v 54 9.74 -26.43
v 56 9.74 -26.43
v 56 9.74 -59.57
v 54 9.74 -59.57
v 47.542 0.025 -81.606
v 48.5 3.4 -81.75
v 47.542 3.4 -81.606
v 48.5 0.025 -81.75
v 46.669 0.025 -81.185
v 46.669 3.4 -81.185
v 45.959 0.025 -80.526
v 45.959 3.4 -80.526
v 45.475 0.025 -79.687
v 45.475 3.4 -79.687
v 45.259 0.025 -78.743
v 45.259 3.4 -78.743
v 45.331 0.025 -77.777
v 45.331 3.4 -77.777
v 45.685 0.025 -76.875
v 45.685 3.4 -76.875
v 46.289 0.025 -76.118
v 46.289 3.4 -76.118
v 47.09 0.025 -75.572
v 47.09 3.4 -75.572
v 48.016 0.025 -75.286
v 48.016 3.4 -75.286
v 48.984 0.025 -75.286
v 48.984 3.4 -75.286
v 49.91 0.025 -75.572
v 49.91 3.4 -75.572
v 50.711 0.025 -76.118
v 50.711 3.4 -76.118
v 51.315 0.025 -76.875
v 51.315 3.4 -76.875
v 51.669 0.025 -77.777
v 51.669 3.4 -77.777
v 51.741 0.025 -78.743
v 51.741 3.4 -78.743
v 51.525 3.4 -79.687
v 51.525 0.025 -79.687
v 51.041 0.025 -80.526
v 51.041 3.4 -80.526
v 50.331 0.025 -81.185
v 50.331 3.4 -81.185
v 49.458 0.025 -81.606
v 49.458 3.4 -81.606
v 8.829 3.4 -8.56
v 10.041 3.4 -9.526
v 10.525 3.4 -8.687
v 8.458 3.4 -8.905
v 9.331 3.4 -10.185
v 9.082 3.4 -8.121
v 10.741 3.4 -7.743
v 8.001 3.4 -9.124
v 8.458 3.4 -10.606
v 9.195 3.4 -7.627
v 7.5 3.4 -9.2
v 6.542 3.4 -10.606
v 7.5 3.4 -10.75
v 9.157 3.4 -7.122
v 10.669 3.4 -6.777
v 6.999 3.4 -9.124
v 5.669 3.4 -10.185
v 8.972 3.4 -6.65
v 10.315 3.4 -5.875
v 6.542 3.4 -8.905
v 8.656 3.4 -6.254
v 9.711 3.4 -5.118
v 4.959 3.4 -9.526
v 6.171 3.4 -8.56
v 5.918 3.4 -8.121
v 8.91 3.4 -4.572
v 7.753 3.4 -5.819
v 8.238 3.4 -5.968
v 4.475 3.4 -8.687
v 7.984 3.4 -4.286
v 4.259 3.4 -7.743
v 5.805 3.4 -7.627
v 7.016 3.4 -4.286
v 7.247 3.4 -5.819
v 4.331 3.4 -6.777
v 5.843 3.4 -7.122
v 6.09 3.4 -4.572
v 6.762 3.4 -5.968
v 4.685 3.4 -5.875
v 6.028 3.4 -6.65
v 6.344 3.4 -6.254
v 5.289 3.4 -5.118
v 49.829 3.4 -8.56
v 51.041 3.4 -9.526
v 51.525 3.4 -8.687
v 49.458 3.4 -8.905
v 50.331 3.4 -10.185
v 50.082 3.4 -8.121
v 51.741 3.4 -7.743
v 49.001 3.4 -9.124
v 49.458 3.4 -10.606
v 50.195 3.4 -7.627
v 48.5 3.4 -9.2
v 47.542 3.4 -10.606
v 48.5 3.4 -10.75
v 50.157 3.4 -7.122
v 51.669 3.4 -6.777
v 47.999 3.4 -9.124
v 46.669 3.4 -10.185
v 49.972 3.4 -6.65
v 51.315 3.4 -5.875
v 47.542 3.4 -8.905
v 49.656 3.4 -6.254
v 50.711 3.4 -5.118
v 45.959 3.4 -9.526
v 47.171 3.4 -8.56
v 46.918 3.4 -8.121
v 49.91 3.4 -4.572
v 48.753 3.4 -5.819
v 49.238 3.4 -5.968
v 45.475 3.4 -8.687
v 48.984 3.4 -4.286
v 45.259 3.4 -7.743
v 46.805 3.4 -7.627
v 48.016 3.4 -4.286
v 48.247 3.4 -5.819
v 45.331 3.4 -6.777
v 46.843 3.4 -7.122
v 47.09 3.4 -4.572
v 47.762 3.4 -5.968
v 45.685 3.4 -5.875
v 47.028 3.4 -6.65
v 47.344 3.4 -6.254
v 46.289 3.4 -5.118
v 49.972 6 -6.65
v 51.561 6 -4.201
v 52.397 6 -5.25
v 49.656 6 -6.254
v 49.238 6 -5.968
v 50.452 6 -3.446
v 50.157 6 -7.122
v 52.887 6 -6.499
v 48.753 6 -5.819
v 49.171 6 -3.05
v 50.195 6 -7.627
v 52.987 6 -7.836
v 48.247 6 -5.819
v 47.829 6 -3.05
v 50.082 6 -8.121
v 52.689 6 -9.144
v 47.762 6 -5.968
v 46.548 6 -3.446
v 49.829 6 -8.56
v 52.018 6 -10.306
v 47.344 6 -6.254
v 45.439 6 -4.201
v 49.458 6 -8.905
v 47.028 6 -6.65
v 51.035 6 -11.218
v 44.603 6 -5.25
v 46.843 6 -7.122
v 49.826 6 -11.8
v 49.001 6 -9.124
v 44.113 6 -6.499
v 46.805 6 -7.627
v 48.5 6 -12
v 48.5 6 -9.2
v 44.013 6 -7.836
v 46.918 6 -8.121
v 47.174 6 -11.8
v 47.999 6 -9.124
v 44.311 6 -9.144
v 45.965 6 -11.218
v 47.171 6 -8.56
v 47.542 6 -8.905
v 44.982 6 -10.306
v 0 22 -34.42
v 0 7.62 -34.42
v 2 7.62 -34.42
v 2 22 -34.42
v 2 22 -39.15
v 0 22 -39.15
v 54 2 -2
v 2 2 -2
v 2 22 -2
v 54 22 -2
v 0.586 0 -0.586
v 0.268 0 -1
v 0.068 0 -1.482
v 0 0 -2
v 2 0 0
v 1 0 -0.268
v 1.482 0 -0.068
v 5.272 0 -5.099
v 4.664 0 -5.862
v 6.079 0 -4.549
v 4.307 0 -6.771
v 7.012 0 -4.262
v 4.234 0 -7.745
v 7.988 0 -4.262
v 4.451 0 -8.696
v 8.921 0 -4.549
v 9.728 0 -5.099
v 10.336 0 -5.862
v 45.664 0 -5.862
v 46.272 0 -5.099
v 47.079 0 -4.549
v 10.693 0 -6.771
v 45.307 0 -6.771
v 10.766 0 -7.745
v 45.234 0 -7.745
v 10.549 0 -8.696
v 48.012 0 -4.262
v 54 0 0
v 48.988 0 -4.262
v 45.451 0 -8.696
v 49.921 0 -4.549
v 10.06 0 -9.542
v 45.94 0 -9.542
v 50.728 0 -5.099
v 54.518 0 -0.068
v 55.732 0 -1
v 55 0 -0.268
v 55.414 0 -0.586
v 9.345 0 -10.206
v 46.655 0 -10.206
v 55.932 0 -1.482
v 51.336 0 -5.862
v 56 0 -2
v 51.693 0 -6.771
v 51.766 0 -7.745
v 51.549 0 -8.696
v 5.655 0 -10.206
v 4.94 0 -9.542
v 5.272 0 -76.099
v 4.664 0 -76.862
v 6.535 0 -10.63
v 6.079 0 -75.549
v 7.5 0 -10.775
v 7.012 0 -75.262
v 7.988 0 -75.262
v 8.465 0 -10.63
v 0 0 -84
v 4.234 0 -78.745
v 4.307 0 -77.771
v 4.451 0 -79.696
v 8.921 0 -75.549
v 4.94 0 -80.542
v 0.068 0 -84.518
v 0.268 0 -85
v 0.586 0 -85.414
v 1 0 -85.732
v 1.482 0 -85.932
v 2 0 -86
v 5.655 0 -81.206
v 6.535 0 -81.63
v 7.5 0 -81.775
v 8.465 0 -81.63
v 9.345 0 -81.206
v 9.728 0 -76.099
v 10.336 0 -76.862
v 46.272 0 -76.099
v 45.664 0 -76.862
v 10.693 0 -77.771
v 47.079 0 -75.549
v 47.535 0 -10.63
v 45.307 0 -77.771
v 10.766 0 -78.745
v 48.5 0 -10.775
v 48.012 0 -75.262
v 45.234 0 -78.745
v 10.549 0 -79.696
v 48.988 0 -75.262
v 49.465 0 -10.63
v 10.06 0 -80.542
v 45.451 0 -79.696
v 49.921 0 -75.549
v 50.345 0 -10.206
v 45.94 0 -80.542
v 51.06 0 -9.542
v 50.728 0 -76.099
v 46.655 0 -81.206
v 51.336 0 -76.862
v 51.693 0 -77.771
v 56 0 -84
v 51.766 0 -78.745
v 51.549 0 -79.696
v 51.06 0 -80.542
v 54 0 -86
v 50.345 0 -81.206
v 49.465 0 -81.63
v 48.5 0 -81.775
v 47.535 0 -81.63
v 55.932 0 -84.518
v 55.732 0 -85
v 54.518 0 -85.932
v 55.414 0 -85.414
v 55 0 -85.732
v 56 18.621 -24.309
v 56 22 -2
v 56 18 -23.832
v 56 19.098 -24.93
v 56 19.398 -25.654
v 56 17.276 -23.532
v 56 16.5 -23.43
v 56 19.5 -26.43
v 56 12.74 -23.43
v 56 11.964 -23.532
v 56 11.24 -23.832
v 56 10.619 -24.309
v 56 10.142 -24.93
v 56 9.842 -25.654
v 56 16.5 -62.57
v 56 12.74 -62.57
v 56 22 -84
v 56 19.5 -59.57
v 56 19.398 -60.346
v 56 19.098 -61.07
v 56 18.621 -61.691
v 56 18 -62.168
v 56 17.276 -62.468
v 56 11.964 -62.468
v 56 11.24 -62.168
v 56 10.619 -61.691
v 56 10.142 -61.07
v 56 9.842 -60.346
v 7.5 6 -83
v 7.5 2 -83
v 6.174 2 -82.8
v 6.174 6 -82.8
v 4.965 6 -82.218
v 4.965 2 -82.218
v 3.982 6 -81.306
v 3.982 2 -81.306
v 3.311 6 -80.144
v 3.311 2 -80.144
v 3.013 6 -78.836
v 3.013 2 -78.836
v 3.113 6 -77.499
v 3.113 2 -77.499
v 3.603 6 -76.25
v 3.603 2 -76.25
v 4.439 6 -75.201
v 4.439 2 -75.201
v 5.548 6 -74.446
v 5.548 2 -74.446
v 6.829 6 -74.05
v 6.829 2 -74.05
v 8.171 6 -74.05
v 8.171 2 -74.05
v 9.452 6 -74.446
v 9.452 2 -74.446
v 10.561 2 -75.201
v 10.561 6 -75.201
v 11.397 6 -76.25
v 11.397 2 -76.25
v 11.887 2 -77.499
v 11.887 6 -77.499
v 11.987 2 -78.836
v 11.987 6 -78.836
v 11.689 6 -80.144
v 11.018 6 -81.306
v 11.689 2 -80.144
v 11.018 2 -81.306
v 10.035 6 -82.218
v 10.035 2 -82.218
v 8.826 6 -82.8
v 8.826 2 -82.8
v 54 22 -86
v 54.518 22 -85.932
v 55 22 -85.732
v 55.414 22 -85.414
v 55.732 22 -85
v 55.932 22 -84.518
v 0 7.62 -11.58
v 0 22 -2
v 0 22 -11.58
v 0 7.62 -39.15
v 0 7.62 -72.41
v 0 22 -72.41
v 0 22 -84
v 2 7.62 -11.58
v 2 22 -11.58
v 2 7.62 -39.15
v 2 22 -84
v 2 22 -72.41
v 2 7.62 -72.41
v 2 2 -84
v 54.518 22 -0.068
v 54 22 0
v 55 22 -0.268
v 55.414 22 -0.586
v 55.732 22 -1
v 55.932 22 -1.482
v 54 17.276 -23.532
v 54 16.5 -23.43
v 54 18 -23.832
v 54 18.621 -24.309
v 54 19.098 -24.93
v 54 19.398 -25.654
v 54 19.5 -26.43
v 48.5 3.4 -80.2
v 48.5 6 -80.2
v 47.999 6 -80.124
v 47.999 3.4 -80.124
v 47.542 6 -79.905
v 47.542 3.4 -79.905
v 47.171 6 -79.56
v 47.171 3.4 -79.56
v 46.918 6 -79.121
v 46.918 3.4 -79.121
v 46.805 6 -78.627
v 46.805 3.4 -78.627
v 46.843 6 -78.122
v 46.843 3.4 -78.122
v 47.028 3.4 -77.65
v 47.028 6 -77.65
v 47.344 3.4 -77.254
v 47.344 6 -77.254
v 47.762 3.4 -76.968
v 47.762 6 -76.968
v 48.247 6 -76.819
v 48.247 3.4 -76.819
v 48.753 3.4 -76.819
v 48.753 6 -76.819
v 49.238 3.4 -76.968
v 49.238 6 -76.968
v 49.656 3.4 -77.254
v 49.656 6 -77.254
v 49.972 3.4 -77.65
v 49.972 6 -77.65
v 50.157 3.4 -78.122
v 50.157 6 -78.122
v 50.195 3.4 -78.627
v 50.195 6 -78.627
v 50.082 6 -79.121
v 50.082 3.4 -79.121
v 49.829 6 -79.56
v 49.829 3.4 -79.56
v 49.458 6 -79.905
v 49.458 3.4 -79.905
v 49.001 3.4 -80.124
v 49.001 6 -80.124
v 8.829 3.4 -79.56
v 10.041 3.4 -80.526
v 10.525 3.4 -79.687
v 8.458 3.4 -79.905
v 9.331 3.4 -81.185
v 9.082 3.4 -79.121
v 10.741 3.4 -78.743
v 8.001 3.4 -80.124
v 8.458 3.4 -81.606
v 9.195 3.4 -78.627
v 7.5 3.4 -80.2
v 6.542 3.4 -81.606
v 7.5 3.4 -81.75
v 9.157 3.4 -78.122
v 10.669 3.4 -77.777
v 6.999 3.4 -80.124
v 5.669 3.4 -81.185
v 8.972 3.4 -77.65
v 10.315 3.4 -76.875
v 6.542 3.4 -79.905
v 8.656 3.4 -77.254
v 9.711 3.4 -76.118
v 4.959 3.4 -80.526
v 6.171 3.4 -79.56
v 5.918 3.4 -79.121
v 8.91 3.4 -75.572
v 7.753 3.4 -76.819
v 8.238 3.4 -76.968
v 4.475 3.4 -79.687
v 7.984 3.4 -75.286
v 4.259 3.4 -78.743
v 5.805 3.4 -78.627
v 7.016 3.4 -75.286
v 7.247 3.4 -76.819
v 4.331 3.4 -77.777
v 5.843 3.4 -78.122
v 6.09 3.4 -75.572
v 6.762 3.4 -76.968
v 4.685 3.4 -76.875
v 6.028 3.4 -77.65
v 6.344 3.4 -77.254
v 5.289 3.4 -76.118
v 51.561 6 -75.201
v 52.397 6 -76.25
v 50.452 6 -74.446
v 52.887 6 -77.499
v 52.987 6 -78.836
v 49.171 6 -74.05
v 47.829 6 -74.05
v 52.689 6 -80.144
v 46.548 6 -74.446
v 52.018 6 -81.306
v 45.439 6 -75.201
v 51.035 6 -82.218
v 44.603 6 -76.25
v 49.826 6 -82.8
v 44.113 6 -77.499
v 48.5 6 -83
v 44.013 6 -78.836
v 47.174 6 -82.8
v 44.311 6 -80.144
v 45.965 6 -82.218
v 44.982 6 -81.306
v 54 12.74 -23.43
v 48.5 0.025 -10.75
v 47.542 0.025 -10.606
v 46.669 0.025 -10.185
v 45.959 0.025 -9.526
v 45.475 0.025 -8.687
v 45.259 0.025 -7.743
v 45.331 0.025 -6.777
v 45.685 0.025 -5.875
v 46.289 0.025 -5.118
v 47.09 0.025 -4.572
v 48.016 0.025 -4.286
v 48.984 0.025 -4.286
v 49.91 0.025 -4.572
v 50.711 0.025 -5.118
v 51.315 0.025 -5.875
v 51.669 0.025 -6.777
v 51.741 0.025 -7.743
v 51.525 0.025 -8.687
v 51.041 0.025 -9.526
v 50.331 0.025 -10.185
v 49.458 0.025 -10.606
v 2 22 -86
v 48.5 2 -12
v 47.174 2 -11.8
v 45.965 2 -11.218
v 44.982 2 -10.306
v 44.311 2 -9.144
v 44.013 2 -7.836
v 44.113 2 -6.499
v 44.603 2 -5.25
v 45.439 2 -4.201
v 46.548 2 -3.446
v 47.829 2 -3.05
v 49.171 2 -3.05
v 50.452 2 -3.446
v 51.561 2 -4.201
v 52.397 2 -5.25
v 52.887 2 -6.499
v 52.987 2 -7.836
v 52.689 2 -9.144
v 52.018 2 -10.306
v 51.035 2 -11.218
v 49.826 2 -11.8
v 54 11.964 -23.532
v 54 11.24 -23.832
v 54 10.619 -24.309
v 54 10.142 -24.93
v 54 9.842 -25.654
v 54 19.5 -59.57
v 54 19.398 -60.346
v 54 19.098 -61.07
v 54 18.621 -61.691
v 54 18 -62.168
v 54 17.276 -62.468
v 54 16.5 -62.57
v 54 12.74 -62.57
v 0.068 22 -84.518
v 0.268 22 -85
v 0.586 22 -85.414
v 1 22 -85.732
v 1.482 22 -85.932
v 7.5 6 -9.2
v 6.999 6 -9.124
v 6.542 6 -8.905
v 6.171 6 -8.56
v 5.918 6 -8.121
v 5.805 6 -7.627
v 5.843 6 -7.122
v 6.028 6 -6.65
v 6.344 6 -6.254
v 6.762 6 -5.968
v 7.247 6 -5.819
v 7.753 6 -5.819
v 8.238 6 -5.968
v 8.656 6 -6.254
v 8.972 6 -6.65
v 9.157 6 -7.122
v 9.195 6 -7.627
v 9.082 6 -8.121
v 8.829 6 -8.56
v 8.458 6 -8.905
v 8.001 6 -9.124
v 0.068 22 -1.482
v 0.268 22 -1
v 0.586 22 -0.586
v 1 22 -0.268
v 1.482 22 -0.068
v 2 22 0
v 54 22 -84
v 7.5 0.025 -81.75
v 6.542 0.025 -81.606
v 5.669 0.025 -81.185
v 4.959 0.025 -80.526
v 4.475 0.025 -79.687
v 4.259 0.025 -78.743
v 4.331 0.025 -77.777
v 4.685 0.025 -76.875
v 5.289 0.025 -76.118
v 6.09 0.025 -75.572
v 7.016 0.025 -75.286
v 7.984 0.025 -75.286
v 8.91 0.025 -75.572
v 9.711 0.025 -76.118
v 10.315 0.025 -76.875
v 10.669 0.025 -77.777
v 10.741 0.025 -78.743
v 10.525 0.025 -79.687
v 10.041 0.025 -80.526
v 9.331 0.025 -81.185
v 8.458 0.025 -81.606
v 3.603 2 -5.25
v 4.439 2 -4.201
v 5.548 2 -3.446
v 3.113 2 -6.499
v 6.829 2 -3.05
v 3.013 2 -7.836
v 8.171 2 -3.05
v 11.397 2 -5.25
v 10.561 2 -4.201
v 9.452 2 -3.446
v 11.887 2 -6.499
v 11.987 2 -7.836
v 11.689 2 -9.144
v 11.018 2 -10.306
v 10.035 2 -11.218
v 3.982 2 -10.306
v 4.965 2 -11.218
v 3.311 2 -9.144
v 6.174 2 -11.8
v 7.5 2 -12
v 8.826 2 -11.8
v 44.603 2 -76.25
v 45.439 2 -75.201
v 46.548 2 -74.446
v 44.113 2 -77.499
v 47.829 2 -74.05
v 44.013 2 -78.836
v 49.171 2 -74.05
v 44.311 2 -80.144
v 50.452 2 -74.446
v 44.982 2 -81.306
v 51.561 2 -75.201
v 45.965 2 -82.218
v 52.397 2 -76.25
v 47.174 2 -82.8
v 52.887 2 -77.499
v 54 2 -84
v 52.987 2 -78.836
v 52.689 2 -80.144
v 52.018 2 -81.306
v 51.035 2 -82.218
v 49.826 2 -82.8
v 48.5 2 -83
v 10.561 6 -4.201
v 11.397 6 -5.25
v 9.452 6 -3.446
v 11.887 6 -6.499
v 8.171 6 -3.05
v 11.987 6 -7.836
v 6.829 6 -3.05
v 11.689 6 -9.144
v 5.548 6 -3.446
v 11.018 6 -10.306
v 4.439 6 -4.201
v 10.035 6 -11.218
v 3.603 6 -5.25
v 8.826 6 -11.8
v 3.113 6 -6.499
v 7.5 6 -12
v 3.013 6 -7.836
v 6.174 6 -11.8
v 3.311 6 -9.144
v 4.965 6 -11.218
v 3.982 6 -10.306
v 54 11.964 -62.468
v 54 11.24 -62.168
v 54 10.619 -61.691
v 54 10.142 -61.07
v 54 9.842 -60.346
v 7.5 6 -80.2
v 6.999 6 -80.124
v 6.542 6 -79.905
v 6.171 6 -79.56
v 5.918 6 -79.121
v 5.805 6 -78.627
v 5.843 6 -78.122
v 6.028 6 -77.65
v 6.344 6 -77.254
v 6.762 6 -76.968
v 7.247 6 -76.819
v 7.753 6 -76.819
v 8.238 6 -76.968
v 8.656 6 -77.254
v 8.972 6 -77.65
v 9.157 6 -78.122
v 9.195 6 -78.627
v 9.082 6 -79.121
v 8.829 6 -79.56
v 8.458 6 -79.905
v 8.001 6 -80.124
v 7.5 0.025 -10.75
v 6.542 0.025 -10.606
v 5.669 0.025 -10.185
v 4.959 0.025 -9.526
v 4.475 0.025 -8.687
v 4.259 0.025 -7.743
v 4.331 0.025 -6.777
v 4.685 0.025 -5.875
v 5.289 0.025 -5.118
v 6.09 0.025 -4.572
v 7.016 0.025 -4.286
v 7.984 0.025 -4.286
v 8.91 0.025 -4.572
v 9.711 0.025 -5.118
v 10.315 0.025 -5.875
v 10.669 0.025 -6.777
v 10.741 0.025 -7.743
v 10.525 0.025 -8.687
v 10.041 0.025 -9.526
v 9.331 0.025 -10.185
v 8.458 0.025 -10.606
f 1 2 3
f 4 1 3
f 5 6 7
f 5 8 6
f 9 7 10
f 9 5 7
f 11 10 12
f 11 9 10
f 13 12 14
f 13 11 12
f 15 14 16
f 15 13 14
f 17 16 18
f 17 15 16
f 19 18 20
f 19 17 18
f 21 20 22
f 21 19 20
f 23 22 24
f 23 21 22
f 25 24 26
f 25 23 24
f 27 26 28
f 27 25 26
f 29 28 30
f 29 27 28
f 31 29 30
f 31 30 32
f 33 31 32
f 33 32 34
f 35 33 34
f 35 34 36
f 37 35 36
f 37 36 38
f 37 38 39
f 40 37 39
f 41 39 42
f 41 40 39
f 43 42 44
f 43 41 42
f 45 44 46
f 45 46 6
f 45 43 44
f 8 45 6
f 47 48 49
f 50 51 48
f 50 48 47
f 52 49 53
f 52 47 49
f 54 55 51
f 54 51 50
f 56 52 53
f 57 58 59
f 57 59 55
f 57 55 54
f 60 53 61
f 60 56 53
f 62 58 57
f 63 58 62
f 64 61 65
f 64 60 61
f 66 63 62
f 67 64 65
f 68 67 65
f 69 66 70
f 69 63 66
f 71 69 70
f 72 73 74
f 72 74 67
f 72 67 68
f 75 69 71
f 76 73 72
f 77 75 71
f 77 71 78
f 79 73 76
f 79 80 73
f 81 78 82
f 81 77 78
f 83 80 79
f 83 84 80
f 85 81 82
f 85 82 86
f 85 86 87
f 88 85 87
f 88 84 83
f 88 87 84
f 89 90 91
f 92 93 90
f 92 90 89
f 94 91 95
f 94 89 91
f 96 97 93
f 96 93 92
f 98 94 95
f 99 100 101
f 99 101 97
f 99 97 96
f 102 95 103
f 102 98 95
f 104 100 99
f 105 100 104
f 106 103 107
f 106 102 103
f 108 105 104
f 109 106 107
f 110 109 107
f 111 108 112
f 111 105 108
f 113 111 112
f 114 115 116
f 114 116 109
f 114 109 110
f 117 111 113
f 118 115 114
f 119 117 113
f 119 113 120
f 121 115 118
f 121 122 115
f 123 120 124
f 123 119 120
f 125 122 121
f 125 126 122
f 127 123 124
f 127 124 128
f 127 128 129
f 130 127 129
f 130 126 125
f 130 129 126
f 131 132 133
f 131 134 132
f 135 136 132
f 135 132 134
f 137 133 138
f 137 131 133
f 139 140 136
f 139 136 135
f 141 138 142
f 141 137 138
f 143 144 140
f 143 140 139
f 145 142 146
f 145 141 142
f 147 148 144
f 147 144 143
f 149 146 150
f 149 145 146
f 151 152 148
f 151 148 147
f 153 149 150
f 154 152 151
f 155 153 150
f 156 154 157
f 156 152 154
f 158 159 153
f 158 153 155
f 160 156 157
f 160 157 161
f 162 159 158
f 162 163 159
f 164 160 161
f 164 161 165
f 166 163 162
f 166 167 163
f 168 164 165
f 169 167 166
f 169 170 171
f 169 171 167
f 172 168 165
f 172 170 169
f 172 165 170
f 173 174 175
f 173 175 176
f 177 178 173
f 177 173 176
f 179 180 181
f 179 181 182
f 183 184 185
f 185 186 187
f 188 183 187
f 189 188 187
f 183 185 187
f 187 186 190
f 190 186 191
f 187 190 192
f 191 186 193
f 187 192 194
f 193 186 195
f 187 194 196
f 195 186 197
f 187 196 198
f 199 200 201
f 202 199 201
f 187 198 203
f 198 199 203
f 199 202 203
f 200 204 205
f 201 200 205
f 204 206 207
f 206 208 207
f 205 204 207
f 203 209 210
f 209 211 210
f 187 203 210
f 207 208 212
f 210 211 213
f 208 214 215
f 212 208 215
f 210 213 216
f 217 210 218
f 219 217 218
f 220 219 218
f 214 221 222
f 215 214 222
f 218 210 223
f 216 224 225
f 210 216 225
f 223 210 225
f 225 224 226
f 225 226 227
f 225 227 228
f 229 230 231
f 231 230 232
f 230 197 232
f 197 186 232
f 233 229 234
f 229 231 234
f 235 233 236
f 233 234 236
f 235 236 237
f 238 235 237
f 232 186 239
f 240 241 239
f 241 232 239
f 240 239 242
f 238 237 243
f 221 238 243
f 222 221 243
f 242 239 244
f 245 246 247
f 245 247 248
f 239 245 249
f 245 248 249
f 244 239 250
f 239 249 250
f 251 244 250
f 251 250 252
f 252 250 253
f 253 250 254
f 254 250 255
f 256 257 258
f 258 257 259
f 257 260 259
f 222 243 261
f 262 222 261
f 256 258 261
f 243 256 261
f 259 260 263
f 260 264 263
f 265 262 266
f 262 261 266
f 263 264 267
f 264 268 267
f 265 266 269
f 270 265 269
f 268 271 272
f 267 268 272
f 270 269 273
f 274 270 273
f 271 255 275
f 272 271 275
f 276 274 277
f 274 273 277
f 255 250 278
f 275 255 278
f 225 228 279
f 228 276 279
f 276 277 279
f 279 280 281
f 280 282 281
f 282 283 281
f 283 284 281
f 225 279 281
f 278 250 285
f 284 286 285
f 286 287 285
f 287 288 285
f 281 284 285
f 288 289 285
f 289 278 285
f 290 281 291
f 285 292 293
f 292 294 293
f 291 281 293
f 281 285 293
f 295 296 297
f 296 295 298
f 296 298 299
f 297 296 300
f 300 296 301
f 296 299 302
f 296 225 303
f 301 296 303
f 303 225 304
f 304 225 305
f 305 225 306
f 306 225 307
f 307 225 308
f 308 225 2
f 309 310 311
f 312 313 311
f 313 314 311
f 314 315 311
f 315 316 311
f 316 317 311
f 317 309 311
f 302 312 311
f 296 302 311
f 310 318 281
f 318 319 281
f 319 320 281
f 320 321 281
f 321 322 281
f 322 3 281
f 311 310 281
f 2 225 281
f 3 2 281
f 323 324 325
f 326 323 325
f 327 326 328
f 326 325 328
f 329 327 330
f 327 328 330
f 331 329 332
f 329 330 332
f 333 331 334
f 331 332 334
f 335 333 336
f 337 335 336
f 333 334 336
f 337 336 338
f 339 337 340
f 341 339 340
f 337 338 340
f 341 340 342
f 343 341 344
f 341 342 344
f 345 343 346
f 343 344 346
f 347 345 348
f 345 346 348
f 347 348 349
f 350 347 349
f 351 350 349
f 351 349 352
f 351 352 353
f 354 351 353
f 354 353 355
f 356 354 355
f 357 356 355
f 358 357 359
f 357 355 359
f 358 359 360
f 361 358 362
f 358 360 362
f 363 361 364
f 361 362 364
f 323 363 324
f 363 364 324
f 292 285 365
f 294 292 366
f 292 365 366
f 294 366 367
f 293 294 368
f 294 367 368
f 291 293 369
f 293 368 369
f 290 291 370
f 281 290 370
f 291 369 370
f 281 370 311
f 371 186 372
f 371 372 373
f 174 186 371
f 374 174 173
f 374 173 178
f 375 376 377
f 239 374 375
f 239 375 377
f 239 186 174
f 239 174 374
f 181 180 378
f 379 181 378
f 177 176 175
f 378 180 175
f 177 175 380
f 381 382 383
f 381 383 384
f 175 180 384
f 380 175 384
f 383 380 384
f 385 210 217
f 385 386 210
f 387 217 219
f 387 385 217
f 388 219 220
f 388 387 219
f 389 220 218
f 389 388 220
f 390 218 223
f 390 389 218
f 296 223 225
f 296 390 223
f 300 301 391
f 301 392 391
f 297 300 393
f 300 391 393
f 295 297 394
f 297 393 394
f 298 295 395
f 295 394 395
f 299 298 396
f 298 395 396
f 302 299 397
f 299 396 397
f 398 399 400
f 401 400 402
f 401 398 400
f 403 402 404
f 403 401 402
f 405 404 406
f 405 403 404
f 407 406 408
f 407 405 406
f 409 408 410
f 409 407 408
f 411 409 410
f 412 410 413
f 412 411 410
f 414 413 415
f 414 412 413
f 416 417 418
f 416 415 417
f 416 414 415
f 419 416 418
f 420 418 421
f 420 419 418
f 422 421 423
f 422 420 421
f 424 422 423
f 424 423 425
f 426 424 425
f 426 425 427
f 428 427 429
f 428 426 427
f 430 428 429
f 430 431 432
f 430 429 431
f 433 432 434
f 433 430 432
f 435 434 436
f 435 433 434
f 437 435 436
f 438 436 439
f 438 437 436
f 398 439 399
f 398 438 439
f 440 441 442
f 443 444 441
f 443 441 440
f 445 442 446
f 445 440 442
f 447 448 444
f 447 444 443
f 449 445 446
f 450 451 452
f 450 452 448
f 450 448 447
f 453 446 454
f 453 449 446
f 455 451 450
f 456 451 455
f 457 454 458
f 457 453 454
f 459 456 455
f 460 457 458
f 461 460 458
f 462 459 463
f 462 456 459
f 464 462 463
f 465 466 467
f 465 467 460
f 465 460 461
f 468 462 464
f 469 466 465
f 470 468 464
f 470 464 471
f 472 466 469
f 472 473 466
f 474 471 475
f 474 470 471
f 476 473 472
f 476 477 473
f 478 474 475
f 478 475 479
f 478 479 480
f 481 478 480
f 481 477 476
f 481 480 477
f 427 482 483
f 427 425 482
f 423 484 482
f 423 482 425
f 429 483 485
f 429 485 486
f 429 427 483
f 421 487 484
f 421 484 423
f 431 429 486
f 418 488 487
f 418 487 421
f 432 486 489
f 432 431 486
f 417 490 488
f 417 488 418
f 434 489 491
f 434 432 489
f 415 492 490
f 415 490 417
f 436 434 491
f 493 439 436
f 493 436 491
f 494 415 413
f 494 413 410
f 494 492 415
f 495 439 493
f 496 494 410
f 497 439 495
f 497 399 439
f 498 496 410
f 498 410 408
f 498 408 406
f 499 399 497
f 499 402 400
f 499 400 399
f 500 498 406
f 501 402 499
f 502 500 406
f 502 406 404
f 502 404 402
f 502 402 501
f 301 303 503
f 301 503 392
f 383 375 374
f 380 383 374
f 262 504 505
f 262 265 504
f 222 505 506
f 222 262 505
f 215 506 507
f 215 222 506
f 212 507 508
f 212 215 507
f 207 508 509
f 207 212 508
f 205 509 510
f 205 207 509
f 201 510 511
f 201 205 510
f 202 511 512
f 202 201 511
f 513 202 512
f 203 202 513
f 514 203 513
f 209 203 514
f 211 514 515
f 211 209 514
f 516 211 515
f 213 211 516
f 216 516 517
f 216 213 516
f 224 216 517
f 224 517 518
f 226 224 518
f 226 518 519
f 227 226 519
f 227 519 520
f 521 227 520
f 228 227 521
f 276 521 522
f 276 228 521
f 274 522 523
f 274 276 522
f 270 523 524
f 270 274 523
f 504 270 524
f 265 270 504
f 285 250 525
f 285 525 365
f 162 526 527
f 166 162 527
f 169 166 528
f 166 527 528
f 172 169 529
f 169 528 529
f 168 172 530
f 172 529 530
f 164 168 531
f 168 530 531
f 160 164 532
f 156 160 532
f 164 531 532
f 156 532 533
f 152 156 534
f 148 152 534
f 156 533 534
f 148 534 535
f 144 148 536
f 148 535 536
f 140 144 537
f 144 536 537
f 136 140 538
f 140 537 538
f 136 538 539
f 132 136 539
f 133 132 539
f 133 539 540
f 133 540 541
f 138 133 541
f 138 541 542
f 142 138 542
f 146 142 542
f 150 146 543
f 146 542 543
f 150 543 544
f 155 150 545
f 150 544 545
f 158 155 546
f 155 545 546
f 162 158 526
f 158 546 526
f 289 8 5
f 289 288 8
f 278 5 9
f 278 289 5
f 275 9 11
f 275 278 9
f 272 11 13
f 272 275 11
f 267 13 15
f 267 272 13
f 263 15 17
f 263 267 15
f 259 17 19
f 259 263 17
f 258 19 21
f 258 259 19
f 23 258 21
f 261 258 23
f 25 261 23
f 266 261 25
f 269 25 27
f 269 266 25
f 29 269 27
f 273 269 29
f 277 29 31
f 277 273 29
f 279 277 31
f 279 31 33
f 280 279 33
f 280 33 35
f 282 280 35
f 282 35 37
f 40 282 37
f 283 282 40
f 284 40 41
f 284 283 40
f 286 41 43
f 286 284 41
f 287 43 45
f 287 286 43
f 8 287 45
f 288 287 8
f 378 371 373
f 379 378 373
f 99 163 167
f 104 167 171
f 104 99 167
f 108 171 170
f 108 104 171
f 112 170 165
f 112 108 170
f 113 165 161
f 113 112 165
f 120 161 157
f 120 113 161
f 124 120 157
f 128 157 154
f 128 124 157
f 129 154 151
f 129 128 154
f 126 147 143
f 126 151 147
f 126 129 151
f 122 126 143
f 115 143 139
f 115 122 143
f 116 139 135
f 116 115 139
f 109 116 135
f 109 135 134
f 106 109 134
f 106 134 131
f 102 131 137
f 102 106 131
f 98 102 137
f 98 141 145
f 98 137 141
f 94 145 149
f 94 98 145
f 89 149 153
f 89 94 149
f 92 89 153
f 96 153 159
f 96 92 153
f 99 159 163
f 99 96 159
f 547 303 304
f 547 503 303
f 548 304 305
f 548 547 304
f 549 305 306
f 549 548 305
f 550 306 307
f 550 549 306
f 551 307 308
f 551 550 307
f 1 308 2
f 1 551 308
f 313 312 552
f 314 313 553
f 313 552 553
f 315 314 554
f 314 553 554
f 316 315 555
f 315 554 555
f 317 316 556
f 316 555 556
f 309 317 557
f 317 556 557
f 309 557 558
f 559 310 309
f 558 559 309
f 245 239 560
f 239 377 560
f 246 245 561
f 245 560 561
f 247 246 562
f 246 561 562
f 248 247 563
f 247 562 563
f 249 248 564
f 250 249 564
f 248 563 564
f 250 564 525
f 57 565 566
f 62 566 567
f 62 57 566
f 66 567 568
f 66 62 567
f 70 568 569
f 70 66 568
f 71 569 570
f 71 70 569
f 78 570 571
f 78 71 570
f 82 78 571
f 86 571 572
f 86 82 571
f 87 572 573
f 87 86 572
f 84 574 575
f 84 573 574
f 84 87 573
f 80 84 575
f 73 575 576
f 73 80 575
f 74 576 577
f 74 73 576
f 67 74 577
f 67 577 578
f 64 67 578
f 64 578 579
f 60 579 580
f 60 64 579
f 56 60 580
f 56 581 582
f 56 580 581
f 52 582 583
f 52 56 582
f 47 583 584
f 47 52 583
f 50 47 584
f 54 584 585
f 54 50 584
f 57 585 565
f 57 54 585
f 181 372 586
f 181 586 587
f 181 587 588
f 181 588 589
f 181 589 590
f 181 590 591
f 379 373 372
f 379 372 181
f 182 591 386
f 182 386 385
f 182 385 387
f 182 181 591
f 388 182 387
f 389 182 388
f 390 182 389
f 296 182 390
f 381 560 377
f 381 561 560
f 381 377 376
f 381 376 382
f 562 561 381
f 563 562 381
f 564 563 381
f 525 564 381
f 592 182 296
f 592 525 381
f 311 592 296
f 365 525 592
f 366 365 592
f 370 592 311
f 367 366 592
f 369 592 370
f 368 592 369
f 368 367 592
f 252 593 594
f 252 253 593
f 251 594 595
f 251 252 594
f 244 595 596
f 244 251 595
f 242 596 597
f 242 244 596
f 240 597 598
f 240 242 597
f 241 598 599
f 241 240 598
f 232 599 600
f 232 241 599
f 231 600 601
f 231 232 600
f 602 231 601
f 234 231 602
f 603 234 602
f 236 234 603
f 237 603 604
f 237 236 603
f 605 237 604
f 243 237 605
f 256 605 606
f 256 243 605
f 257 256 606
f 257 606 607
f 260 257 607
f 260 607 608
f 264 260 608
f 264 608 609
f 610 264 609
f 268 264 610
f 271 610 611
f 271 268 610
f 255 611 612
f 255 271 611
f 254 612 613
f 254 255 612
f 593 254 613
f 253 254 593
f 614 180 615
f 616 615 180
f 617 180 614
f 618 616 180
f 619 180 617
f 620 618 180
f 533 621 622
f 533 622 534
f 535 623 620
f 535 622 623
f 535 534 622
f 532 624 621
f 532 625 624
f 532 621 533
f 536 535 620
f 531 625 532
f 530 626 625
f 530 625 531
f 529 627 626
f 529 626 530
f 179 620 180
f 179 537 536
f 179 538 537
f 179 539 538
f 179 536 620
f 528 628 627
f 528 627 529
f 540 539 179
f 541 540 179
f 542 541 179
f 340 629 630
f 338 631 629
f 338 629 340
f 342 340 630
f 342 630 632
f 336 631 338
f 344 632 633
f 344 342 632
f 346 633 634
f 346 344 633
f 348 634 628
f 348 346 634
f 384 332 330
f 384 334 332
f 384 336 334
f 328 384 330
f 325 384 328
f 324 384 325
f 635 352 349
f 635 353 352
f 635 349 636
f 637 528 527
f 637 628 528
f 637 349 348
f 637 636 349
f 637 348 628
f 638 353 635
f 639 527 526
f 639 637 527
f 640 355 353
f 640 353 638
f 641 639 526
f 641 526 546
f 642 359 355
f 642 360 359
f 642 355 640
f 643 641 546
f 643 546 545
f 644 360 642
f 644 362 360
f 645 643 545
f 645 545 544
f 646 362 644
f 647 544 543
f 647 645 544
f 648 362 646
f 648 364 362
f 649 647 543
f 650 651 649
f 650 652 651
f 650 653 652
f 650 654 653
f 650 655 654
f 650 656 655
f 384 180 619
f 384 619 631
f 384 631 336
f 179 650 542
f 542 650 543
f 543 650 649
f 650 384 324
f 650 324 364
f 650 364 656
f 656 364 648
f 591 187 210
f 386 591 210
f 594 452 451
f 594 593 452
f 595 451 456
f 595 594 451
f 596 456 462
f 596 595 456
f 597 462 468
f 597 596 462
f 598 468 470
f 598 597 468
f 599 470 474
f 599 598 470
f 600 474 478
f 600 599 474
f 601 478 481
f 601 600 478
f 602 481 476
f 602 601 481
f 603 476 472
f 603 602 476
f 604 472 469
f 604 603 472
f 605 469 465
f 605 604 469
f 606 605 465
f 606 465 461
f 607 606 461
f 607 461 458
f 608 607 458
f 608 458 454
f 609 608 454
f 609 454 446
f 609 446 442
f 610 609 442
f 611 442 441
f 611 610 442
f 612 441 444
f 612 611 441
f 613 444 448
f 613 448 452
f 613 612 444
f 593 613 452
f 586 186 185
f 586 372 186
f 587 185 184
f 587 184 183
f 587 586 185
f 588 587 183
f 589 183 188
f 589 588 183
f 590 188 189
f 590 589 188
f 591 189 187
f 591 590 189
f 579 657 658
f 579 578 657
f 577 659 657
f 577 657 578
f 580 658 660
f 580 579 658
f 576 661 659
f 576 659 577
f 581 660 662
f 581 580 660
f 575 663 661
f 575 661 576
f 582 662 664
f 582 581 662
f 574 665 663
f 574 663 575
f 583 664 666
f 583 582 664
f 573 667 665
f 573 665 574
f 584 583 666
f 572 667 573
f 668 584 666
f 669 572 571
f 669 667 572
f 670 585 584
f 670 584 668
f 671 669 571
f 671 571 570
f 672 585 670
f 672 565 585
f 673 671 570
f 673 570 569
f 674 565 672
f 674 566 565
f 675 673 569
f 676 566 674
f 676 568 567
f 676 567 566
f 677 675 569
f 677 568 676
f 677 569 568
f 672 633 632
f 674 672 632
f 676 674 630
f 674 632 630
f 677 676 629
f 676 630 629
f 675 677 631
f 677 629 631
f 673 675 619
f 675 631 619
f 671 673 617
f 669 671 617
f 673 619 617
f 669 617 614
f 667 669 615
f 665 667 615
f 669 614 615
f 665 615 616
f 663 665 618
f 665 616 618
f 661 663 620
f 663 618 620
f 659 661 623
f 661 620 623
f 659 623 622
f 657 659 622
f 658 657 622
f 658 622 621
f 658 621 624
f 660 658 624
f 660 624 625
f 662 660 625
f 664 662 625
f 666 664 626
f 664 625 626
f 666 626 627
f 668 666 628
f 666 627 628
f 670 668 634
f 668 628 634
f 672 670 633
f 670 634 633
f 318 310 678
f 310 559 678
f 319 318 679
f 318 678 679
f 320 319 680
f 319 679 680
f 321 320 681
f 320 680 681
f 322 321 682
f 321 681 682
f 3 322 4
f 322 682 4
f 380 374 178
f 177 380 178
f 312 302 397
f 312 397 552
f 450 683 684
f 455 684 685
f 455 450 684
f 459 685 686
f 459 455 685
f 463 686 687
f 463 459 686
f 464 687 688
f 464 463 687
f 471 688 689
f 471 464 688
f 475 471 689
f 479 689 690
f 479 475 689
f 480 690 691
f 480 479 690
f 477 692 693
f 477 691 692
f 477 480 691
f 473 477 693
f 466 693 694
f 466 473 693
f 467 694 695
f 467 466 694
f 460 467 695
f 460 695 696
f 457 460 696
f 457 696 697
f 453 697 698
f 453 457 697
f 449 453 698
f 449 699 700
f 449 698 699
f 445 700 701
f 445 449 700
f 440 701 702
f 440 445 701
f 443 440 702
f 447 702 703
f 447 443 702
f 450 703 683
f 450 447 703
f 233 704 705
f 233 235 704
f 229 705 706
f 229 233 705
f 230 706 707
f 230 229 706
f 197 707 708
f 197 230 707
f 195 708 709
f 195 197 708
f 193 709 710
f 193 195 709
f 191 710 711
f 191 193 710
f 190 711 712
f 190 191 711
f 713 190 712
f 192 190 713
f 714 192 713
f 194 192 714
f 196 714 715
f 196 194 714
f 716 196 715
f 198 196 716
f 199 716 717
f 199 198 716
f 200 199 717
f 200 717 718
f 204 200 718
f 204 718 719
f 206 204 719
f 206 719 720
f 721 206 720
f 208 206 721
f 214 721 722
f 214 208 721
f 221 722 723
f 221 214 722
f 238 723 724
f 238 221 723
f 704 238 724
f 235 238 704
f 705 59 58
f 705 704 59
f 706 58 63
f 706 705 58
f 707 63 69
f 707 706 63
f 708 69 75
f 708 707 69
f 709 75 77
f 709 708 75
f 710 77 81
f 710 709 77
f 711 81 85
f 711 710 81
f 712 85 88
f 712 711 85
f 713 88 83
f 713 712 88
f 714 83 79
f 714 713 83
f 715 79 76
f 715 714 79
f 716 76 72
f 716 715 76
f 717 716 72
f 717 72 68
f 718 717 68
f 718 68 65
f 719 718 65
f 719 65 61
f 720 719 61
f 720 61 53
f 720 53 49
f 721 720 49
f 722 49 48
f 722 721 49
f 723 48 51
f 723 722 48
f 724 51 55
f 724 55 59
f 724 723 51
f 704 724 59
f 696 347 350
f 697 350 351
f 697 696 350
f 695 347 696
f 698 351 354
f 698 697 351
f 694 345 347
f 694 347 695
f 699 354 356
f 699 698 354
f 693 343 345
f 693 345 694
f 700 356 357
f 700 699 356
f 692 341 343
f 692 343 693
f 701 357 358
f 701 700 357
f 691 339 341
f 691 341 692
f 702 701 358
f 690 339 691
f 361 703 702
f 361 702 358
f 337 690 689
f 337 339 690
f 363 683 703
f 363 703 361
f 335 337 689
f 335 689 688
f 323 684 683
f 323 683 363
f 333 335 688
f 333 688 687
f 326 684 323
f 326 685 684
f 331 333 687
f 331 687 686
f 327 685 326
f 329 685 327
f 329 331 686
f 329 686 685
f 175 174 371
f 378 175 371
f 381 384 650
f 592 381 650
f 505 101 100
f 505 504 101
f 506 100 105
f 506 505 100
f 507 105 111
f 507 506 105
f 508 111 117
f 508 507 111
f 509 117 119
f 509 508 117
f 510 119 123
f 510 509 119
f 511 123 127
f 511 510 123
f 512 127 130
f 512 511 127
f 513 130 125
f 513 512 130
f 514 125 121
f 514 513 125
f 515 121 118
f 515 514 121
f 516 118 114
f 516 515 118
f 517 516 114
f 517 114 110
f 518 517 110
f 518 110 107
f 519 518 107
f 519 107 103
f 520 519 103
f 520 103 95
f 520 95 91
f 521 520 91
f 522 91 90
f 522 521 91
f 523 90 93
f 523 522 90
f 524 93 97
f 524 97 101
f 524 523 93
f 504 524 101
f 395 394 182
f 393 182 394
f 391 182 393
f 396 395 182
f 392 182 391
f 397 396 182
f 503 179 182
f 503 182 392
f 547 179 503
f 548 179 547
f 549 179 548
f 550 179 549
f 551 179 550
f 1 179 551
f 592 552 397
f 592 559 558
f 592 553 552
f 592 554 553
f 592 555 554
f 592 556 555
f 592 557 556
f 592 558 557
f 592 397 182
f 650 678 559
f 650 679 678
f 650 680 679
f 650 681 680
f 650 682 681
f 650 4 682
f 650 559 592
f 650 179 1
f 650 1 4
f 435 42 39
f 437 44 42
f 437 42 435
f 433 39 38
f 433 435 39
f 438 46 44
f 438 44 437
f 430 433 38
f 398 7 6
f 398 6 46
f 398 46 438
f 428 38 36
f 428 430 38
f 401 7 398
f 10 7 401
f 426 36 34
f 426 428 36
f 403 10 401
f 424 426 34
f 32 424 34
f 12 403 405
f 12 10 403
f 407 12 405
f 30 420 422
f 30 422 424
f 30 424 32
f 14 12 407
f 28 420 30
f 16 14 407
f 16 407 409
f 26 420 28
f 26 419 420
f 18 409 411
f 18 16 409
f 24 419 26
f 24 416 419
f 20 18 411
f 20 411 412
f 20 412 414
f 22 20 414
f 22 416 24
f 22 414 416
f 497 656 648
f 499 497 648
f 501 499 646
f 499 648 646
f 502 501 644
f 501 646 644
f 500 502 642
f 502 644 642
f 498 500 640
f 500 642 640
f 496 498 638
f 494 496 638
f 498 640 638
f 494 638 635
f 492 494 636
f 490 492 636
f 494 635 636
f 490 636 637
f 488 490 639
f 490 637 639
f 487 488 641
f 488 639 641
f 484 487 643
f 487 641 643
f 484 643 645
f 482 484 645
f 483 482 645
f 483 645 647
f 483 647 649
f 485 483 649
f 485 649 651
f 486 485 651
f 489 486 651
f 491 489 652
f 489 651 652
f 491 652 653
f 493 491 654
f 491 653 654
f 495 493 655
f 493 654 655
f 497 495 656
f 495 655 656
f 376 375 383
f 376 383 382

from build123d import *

# Parameters (mm, degrees)
SKIZZE1_W                                    = 56
SKIZZE1_H                                    = 86
AUFSATZ_LINEAR_AUSTRAGEN1_DEPTH              = 22
WANDUNG1_T                                   = -2
SKIZZE2_R                                    = 4.5
AUFSATZ_LINEAR_AUSTRAGEN2_DEPTH              = 4
VERRUNDUNG1_R                                = 2
SKIZZE3_W                                    = 22.84
SKIZZE3_H                                    = 14.38
SCHNITT_LINEAR_AUSTRAGEN1_DEPTH              = 2
STIRNSENKUNG_F_R_M3_ZYLINDERSCHRAUBE_2_COUNT = 2
STIRNSENKUNG_F_R_M3_ZYLINDERSCHRAUBE_2_PITCH = 81.987803971
STIRNSENKUNG_F_R_M3_ZYLINDERSCHRAUBE_3_COUNT = 2
STIRNSENKUNG_F_R_M3_ZYLINDERSCHRAUBE_3_PITCH = 71
STIRNSENKUNG_F_R_M3_ZYLINDERSCHRAUBE_4_COUNT = 2
STIRNSENKUNG_F_R_M3_ZYLINDERSCHRAUBE_4_PITCH = 41
SKIZZE7_W                                    = 33.26
SKIZZE7_H                                    = 14.38
SCHNITT_LINEAR_AUSTRAGEN2_DEPTH              = 10
SKIZZE8_W                                    = 39.14
SKIZZE8_H                                    = 9.76
SCHNITT_LINEAR_AUSTRAGEN3_DEPTH              = 10
VERRUNDUNG2_R                                = 3


with BuildPart() as part:
    # Skizze1 → Aufsatz-Linear austragen1 (new body)
    with BuildSketch(Plane(origin=(0, 0, 0), x_dir=(1, 0, 0), z_dir=(0, 1, 0))):
        with Locations((28, 43)):
            Rectangle(SKIZZE1_W, SKIZZE1_H)
    extrude(amount=AUFSATZ_LINEAR_AUSTRAGEN1_DEPTH)

    # Wandung1
    wandung1_openings = [part.faces().sort_by_distance(p)[0] for p in [
        (28, 22, -43),
    ]]
    offset(amount=WANDUNG1_T, openings=wandung1_openings, kind=Kind.INTERSECTION)

    # Skizze2 → Aufsatz-Linear austragen2 (add)
    with BuildSketch(Plane(origin=(0, 2, 0), x_dir=(1, 0, 0), z_dir=(0, 1, 0))):
        with Locations(Location((7.5, 7.5, 0), (0, 0, 90))):
            Circle(SKIZZE2_R)
        with Locations(Location((48.5, 7.5, 0), (0, 0, 90))):
            Circle(SKIZZE2_R)
        with Locations(Location((48.5, 78.5, 0), (0, 0, 90))):
            Circle(SKIZZE2_R)
        with Locations(Location((7.5, 78.5, 0), (0, 0, 90))):
            Circle(SKIZZE2_R)
    extrude(amount=AUFSATZ_LINEAR_AUSTRAGEN2_DEPTH)

    # Verrundung1
    verrundung1_edges = [part.edges().sort_by_distance(p)[0] for p in [
        (0, 11, -86),
        (56, 11, -86),
        (56, 11, 0),
        (0, 11, 0),
    ]]
    fillet(verrundung1_edges, radius=VERRUNDUNG1_R)

    # Skizze3 → Schnitt-Linear austragen1 (cut)
    with BuildSketch(Plane.ZY):
        with Locations((-23, 14.81)):
            Rectangle(SKIZZE3_W, SKIZZE3_H)
    extrude(amount=-SCHNITT_LINEAR_AUSTRAGEN1_DEPTH, mode=Mode.SUBTRACT)

    # Skizze6 → Stirnsenkung für M3 Zylinderschraube mit Innensechskant1 (revolve, cut)
    with BuildSketch(Plane(origin=(48.5, 0, -7.5), x_dir=(0, 0, -1), z_dir=(1, 0, 0))):
        Polygon((0, 0), (0, 15.021463052), (1.7, 14), (1.7, 3.4), (3.25, 3.4), (3.25, 0.025), (3.275, 0), align=None)
    stirnsenkung_f_r_m3_zylinderschraube_mit = revolve(axis=Axis((48.5, -6.35, -7.5), (0, 1, 0)), mode=Mode.SUBTRACT)

    # Stirnsenkung f_r M3 Zylinderschraube 2: Stirnsenkung für M3 Zylinderschraube mit Innensechskant1 ×2
    with Locations(*[Vector(-0.5000743770922673, 0, -0.865982457891487) * (i * STIRNSENKUNG_F_R_M3_ZYLINDERSCHRAUBE_2_PITCH) for i in range(1, STIRNSENKUNG_F_R_M3_ZYLINDERSCHRAUBE_2_COUNT)]):
        add(stirnsenkung_f_r_m3_zylinderschraube_mit, mode=Mode.SUBTRACT)

    # Stirnsenkung f_r M3 Zylinderschraube 3: Stirnsenkung für M3 Zylinderschraube mit Innensechskant1 ×2
    with Locations(*[(0, 0, -i * STIRNSENKUNG_F_R_M3_ZYLINDERSCHRAUBE_3_PITCH) for i in range(1, STIRNSENKUNG_F_R_M3_ZYLINDERSCHRAUBE_3_COUNT)]):
        add(stirnsenkung_f_r_m3_zylinderschraube_mit, mode=Mode.SUBTRACT)

    # Stirnsenkung f_r M3 Zylinderschraube 4: Stirnsenkung für M3 Zylinderschraube mit Innensechskant1 ×2
    with Locations(*[(-i * STIRNSENKUNG_F_R_M3_ZYLINDERSCHRAUBE_4_PITCH, 0, 0) for i in range(1, STIRNSENKUNG_F_R_M3_ZYLINDERSCHRAUBE_4_COUNT)]):
        add(stirnsenkung_f_r_m3_zylinderschraube_mit, mode=Mode.SUBTRACT)

    # Skizze7 → Schnitt-Linear austragen2 (cut)
    with BuildSketch(Plane.ZY):
        with Locations((-55.78, 14.81)):
            Rectangle(SKIZZE7_W, SKIZZE7_H)
    extrude(amount=-SCHNITT_LINEAR_AUSTRAGEN2_DEPTH, mode=Mode.SUBTRACT)

    # Skizze8 → Schnitt-Linear austragen3 (cut)
    with BuildSketch(Plane(origin=(56, 0, 0), x_dir=(0, 0, -1), z_dir=(1, 0, 0))):
        with Locations((43, 14.62)):
            Rectangle(SKIZZE8_W, SKIZZE8_H)
    extrude(amount=-SCHNITT_LINEAR_AUSTRAGEN3_DEPTH, mode=Mode.SUBTRACT)

    # Verrundung2
    verrundung2_edges = [part.edges().sort_by_distance(p)[0] for p in [
        (55, 9.74, -23.43),
        (55, 19.5, -23.43),
        (55, 19.5, -62.57),
        (55, 9.74, -62.57),
    ]]
    fillet(verrundung2_edges, radius=VERRUNDUNG2_R)


solid = part.part
